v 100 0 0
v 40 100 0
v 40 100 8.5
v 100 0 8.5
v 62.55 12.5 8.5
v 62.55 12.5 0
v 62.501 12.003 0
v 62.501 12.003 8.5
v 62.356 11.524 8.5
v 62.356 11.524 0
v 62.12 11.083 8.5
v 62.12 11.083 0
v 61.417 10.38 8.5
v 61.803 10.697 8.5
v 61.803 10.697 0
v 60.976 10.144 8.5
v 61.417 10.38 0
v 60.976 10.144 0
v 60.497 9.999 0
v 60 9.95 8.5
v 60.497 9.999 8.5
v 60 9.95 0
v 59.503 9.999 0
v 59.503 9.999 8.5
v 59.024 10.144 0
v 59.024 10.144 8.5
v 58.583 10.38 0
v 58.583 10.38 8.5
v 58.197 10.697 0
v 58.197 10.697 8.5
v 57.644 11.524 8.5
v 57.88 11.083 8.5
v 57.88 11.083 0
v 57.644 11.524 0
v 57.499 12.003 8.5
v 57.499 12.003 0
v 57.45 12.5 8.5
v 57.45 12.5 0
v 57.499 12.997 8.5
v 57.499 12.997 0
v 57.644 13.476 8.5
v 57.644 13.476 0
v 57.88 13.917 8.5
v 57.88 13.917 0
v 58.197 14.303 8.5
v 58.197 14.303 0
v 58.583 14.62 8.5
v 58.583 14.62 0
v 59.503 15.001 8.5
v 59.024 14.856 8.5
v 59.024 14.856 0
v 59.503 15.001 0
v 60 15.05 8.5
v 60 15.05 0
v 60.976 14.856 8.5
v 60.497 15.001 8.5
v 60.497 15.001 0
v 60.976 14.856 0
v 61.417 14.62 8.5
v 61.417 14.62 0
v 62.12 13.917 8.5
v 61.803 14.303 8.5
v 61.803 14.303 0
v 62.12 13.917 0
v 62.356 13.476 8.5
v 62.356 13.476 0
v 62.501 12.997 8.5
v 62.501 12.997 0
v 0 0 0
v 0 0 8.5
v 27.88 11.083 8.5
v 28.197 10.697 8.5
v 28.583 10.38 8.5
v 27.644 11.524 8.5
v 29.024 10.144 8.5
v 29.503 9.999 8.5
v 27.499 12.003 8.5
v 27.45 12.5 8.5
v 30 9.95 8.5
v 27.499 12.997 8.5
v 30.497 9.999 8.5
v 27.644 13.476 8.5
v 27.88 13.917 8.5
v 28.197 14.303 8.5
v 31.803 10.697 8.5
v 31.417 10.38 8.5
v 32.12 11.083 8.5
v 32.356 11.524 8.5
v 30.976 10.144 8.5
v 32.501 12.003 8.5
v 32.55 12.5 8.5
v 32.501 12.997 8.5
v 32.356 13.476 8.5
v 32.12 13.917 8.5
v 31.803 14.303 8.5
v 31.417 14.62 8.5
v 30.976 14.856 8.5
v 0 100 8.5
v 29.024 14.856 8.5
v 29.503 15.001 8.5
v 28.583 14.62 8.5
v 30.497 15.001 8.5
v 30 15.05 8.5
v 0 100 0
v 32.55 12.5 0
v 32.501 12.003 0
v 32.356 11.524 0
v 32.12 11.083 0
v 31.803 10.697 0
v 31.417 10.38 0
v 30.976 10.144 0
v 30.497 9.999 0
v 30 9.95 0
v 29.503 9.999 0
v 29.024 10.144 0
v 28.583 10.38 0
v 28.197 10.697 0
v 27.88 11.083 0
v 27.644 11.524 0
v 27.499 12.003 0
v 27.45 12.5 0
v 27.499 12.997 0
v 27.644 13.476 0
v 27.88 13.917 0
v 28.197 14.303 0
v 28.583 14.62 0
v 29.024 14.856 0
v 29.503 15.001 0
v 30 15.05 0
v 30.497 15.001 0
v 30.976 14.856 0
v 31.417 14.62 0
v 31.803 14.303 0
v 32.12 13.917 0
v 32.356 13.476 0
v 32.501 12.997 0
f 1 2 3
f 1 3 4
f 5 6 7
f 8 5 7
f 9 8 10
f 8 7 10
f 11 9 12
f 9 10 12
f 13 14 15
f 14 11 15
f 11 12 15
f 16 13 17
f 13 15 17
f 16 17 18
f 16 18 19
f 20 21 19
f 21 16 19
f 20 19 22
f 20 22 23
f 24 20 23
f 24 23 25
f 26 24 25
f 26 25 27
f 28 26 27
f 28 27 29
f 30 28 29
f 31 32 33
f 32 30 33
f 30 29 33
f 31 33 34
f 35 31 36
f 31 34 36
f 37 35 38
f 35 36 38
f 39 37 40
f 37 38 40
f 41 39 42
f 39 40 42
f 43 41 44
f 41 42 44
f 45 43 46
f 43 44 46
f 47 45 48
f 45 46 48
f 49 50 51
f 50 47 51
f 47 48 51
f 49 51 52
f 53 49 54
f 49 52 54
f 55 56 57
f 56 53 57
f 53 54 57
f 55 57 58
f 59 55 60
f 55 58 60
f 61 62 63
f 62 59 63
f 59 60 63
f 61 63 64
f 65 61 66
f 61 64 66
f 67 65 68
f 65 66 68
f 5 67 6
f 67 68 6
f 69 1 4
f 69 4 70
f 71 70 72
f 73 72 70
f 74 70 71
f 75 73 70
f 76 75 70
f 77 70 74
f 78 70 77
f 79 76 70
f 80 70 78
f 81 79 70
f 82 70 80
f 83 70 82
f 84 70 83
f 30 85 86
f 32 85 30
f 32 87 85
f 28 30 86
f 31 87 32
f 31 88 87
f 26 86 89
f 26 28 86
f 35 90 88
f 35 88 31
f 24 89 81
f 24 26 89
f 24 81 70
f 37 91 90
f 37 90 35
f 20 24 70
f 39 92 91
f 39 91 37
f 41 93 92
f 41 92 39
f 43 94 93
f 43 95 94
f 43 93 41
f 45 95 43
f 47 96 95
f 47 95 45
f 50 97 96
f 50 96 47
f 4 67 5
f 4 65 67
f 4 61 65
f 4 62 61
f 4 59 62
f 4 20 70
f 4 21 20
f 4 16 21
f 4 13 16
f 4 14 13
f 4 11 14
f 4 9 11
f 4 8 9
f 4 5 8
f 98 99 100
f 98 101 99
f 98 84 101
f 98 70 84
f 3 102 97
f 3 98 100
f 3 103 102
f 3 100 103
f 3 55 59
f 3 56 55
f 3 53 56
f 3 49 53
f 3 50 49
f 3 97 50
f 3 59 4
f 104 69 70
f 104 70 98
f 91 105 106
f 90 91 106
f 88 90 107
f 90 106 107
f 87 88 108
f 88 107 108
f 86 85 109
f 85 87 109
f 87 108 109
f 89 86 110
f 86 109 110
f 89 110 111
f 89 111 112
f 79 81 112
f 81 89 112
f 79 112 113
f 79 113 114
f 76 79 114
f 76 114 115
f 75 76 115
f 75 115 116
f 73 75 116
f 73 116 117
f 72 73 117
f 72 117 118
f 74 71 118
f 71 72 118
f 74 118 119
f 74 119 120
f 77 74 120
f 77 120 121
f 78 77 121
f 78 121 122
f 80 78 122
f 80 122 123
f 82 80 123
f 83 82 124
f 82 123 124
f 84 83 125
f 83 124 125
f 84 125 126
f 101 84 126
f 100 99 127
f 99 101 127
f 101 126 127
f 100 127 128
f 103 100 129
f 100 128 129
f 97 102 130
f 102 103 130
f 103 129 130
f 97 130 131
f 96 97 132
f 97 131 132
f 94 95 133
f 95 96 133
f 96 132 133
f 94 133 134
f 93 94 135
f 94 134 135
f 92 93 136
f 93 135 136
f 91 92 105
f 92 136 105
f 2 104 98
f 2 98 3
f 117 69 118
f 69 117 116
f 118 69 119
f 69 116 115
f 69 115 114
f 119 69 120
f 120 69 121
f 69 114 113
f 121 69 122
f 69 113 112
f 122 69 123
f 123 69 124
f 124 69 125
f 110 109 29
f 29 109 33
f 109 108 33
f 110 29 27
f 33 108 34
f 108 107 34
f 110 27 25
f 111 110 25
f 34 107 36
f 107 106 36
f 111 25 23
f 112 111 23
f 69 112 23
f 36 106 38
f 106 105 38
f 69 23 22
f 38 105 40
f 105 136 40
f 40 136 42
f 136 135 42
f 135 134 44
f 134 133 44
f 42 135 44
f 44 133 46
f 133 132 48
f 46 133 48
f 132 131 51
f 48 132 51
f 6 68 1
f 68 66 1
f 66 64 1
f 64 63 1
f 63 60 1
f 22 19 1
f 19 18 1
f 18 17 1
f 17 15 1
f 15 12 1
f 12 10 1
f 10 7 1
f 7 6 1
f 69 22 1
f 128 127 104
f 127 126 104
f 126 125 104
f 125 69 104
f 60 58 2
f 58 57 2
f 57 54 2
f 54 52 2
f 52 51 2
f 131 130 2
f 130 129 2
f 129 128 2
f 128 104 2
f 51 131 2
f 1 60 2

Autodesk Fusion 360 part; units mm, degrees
sketch "Sketch1" plane through (0, 0, 0) normal (0, 0, 1) x (1, 0, 0)
  line L0 (0, 0) -> (0, 100)
  line L1 (0, 100) -> (40, 100)
  line L2 (40, 100) -> (100, 0)
  line L3 (100, 0) -> (0, 0)
  circle A0 centre (30, 12.5) radius 2.55
  circle A1 centre (60, 12.5) radius 2.55
  dimension "d3" = 40
  dimension "d4" = 100
  dimension "d5" = 100
  dimension "d14" = 12.5
  dimension "d15" = 12.5
  dimension "d16" = 5.1
  dimension "d17" = 5.1
  dimension "d18" = 30
  dimension "d19" = 30
extrude "Extrude1" add sketch "Sketch1" along normal blind 8.5
equation "d15 = d14"
equation "d17 = d16"
